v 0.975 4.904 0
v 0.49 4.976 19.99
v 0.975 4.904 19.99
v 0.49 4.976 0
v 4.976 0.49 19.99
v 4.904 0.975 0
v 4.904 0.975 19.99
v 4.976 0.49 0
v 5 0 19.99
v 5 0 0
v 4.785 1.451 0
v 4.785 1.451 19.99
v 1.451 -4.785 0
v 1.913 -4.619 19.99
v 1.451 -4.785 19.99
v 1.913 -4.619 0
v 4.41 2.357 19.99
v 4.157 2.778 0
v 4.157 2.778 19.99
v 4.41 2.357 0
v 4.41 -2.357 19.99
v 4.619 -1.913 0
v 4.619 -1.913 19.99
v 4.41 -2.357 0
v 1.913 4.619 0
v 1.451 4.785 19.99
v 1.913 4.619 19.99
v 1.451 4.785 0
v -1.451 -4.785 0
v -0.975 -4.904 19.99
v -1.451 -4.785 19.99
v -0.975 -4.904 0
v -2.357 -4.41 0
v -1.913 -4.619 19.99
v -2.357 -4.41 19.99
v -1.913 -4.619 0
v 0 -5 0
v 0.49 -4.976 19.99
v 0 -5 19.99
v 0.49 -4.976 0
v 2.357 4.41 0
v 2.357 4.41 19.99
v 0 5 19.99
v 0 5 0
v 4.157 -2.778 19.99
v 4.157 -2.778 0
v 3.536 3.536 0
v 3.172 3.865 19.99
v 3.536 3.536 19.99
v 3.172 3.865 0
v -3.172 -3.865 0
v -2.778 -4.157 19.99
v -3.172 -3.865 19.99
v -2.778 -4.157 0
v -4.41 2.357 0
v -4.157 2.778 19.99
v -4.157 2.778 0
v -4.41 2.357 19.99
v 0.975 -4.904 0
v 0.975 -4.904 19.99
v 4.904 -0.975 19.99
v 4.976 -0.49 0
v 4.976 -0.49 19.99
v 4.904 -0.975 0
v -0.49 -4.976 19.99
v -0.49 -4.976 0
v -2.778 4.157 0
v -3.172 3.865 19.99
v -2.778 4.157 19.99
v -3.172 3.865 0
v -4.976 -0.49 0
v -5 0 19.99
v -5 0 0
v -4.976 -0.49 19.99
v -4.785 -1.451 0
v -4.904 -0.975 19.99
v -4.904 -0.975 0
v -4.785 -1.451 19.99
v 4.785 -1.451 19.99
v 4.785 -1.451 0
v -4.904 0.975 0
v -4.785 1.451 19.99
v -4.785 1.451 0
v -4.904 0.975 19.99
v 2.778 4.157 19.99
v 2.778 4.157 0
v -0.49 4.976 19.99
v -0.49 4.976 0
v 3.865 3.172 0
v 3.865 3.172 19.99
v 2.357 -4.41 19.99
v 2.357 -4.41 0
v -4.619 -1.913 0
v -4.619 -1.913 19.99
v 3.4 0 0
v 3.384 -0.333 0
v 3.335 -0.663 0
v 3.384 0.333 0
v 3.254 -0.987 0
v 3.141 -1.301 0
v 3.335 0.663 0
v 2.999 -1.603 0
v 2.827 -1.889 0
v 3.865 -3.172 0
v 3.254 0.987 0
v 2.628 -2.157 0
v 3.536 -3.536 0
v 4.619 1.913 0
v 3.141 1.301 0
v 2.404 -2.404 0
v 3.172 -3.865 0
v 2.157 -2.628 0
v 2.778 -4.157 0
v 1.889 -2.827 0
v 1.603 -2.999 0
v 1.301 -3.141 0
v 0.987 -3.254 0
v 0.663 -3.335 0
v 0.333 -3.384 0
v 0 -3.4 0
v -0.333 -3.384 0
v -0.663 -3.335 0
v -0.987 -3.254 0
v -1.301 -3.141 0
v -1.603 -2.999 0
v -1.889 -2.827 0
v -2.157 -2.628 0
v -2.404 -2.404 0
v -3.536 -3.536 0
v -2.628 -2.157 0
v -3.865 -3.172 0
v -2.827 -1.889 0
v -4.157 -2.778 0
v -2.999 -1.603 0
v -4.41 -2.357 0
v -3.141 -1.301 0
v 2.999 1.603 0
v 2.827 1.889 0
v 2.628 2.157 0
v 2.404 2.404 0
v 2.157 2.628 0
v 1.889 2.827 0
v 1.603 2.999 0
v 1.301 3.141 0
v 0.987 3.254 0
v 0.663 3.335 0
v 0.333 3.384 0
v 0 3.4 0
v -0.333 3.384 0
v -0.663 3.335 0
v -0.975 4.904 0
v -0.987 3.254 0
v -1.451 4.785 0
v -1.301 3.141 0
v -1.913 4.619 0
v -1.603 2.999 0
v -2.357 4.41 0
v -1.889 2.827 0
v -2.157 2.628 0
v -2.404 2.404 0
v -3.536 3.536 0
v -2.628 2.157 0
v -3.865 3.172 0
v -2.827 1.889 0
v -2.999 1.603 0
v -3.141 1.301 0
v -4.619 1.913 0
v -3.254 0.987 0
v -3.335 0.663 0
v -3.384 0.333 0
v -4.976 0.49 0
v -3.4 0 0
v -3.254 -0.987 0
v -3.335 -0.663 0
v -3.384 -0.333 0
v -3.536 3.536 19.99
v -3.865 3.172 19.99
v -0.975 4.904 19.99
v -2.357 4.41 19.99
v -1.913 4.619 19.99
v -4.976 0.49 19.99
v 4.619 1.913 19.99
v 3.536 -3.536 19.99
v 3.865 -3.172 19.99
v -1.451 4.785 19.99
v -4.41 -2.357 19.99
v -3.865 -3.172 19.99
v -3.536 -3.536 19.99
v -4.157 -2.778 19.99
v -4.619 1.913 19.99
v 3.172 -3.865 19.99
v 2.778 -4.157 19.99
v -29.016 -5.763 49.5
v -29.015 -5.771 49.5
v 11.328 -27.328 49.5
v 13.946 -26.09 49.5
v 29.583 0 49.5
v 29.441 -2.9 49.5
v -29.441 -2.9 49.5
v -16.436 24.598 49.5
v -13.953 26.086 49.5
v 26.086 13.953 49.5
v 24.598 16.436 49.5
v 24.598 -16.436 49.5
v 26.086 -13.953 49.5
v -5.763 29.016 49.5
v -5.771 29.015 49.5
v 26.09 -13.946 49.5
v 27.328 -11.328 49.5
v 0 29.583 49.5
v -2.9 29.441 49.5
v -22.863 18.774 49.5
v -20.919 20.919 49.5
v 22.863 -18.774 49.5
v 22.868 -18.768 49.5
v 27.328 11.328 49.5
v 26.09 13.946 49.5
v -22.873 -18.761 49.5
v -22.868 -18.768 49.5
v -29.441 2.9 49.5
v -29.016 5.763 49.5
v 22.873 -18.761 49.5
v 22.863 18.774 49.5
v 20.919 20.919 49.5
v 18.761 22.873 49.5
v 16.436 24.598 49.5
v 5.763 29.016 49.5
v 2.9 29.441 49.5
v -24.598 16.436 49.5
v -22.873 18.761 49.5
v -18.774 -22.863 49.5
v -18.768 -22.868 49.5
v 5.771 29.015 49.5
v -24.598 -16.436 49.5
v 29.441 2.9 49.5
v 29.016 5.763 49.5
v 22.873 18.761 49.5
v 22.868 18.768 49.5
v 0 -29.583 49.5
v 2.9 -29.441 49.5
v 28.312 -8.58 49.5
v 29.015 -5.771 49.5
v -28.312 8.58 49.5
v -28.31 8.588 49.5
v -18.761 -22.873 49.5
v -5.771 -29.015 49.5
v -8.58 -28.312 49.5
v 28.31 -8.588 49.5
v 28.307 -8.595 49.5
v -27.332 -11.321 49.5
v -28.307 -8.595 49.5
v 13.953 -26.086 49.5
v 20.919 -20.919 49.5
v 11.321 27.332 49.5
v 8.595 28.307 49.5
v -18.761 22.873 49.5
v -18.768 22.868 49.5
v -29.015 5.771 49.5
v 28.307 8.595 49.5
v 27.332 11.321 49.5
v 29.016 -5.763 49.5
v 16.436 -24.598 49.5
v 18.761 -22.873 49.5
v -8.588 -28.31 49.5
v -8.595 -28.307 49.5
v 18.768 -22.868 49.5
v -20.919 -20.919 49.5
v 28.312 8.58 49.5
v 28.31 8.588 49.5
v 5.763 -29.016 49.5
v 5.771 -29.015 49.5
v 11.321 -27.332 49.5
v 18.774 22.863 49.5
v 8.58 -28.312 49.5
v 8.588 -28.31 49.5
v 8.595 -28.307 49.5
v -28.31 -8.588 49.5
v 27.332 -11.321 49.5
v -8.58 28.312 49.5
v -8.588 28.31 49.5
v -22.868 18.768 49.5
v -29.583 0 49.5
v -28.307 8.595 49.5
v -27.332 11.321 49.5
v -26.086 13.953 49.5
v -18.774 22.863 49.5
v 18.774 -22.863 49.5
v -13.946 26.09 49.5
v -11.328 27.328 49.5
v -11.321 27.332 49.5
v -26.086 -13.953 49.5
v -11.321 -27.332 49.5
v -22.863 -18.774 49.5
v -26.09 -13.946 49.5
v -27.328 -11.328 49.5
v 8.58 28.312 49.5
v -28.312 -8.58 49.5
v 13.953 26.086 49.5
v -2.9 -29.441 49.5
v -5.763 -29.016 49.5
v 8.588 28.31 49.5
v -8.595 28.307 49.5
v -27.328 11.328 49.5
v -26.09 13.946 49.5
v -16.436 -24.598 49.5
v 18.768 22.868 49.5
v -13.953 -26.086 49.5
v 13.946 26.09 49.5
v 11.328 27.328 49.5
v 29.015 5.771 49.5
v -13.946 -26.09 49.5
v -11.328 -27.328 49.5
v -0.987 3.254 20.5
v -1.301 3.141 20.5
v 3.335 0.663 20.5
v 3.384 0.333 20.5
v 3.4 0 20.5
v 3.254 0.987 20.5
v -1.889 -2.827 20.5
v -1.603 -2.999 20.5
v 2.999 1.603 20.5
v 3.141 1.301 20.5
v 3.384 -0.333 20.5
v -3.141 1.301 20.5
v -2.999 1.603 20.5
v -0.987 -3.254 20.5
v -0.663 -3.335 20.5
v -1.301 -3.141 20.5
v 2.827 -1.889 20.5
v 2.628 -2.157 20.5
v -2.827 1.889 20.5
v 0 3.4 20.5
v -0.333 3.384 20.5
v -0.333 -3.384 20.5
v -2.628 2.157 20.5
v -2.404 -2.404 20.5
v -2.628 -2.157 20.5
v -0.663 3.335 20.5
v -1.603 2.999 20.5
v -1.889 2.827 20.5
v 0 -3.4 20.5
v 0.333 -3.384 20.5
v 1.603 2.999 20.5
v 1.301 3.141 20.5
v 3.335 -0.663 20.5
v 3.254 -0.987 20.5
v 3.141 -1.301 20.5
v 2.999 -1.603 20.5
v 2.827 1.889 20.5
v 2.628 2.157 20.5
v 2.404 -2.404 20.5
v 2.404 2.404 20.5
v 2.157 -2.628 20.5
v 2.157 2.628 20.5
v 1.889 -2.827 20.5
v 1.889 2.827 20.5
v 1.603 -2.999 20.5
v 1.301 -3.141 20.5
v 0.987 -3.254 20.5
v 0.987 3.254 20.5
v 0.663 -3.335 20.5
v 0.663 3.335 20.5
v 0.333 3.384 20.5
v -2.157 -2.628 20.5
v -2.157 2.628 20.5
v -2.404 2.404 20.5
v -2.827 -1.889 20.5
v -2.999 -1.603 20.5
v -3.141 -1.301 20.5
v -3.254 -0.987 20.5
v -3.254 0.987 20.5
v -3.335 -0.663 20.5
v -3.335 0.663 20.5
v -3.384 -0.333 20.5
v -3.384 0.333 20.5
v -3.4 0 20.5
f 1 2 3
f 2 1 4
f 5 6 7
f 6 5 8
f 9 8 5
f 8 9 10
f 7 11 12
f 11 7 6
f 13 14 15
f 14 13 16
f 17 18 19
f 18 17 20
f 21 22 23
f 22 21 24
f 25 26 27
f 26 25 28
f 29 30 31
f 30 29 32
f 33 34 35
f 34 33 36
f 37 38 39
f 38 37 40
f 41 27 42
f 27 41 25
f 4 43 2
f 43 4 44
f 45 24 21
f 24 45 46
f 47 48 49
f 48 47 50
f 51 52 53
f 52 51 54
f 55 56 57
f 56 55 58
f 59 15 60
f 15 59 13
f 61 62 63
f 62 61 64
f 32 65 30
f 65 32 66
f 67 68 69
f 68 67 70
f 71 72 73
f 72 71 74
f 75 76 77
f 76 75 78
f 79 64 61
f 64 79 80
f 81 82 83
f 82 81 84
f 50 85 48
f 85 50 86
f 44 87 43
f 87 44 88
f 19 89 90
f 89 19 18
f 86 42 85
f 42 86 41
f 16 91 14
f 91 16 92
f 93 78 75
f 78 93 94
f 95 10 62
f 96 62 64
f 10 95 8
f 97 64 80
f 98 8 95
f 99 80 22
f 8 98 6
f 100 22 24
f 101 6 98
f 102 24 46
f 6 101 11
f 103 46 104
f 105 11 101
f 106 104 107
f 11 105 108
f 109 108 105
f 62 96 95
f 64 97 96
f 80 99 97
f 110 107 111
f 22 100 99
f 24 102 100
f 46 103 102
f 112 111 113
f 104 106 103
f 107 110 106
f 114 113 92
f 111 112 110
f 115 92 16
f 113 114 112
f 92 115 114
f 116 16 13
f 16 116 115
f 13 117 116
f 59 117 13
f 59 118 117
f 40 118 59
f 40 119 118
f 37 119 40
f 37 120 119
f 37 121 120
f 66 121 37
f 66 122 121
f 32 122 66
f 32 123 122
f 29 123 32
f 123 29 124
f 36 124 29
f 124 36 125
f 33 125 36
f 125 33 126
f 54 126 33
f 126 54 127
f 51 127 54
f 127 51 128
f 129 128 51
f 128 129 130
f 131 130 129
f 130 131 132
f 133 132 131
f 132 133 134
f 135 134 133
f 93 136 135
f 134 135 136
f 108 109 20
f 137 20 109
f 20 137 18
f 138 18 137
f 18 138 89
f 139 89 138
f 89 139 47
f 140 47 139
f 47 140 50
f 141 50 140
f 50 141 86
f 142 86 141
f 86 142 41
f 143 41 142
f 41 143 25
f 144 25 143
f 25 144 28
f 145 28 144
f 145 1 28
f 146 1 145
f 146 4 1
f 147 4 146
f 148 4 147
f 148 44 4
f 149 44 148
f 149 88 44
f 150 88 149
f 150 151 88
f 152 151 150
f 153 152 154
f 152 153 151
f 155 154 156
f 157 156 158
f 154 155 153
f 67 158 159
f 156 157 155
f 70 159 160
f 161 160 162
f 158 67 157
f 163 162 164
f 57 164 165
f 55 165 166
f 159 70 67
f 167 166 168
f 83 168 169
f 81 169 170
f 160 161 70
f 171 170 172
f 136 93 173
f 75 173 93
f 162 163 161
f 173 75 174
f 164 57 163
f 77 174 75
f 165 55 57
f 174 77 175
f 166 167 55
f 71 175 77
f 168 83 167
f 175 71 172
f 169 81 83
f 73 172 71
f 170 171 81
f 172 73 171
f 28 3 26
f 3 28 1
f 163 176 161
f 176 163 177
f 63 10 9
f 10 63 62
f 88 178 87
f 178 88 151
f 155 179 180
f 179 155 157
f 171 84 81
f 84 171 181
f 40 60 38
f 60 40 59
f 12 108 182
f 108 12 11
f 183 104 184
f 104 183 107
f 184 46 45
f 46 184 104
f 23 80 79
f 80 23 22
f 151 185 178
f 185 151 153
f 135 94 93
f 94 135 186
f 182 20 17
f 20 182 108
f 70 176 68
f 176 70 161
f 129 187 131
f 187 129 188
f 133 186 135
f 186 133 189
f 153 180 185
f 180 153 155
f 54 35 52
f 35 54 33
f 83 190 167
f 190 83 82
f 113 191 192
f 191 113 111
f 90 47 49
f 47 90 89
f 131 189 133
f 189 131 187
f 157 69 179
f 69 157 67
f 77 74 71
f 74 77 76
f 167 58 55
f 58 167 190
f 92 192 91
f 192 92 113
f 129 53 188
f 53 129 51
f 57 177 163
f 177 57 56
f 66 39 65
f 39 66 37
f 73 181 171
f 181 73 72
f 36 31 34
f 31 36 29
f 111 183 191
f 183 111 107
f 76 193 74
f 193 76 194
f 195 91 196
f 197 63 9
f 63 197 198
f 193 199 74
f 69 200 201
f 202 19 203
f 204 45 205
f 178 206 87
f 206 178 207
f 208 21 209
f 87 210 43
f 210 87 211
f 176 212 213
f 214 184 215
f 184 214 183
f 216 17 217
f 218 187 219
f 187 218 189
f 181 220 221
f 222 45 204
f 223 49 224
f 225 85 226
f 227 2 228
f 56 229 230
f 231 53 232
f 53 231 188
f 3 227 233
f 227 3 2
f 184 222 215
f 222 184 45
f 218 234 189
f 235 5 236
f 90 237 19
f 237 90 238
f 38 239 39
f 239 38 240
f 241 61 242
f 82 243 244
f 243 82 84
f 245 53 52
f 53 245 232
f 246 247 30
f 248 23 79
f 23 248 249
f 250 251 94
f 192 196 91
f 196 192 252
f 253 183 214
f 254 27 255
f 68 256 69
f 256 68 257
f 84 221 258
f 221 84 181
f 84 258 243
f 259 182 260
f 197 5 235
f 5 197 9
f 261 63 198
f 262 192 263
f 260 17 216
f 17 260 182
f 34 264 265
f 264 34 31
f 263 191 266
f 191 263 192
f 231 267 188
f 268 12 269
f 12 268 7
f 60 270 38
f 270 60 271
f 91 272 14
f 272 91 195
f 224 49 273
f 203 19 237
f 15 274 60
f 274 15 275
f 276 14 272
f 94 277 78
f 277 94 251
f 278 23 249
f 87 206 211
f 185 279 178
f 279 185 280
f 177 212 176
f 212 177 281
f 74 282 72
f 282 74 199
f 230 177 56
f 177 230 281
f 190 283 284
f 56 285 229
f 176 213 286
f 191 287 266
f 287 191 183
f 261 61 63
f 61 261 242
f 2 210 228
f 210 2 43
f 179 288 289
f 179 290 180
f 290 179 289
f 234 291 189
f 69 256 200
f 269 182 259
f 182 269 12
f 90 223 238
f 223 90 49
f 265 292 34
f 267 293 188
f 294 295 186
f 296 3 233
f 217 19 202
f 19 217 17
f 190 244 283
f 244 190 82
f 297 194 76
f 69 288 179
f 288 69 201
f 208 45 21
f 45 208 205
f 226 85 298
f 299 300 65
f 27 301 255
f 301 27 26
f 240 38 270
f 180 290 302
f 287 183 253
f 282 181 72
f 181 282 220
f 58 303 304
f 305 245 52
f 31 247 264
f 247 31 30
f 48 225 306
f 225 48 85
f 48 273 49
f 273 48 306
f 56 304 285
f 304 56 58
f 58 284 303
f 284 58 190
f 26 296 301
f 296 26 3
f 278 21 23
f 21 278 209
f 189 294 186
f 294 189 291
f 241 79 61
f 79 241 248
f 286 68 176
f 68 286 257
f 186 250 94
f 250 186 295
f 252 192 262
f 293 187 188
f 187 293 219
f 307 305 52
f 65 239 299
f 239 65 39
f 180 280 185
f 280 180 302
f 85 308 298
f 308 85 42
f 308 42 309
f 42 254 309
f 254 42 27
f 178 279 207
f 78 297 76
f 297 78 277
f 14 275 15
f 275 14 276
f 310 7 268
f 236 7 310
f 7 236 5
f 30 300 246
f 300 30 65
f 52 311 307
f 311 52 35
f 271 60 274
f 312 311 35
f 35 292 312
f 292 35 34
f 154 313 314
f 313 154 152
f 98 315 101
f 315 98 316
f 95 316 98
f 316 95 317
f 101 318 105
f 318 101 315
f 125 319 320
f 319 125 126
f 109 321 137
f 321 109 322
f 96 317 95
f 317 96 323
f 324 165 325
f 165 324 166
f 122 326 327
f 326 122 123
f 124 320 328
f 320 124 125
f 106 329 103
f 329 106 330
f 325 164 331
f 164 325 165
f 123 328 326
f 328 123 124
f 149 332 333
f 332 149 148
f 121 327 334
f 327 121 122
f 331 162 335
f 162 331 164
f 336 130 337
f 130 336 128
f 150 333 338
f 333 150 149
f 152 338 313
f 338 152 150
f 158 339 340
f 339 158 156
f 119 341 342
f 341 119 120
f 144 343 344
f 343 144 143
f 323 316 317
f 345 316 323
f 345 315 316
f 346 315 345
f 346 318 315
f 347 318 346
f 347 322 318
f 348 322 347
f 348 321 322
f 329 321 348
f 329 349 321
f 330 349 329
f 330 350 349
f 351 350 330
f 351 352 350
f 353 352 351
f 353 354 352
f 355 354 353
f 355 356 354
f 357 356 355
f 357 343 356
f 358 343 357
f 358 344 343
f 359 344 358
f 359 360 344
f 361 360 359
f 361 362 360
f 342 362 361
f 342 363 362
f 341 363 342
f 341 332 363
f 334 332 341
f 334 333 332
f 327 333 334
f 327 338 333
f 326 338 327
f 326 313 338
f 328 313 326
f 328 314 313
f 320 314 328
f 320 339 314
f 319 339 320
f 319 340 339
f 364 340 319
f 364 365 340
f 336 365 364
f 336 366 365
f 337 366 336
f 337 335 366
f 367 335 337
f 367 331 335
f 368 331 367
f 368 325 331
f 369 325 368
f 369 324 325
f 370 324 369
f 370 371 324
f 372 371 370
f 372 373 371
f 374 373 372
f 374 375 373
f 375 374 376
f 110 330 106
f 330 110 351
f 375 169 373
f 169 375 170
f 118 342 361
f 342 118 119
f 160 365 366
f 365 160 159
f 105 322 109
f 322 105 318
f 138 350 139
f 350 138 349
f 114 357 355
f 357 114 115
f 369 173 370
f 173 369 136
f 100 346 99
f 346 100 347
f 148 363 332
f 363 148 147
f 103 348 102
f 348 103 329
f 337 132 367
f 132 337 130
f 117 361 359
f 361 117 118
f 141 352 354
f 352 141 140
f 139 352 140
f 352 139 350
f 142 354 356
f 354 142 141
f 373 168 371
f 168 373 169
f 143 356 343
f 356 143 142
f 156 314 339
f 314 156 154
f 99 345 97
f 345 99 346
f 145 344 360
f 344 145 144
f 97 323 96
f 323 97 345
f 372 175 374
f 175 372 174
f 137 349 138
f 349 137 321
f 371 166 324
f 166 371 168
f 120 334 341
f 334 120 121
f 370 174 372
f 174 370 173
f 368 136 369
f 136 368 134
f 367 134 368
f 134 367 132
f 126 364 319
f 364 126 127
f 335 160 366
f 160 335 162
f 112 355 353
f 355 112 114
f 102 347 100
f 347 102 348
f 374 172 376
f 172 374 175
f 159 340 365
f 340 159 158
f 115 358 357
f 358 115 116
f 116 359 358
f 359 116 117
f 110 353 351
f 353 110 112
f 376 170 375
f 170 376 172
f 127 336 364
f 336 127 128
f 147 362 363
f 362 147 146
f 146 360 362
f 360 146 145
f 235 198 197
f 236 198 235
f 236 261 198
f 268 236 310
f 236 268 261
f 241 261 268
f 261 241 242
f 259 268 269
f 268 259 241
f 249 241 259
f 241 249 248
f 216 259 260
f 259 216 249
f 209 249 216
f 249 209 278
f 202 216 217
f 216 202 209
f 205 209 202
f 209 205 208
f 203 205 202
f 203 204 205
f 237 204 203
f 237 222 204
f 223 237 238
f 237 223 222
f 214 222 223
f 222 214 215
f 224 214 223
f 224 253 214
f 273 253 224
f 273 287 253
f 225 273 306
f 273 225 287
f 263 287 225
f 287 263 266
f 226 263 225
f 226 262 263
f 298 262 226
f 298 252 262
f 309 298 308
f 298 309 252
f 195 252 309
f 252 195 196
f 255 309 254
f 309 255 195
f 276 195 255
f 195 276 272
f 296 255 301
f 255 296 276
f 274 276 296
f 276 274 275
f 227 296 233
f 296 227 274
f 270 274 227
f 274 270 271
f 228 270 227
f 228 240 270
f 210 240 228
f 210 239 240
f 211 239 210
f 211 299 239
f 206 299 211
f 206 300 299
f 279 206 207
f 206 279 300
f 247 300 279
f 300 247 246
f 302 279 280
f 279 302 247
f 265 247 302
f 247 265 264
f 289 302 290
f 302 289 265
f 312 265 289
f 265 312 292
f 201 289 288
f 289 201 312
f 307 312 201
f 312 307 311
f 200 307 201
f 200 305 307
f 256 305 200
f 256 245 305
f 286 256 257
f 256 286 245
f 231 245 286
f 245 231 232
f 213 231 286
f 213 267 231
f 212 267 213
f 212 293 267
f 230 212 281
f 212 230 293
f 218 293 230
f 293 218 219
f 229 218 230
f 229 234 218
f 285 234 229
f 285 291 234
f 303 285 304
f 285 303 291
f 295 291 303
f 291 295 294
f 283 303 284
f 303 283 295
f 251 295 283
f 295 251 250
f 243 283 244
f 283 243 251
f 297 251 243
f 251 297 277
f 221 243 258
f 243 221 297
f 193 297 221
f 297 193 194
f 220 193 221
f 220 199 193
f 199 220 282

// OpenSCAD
// Small lab funnel, printed upright
// Units: mm

$fn = 64;

// --- Dimensions ---
spout_od      = 10;    // spout outer diameter
spout_len     = 20;    // spout length (z = 0 to 20)
spout_wall    = 1.6;   // wall thickness everywhere
cone_bottom_d = 10;    // cone outer diameter at z = 20
cone_top_d    = 60;    // rim outer diameter at z = 50
rim_z         = 50;    // rim height
eps           = 0.5;   // cutter overshoot

// --- Derived ---
spout_id = spout_od - 2 * spout_wall;   // 6.8 mm bore

difference() {
    union() {
        // Spout
        cylinder(d = spout_od, h = spout_len);
        // Cone (overlaps spout slightly for a clean union)
        translate([0, 0, spout_len - 0.01])
            cylinder(d1 = cone_bottom_d, d2 = cone_top_d, h = rim_z - spout_len + 0.01);
    }
    // Hollow the spout bore through the full length
    translate([0, 0, -eps])
        cylinder(d = spout_id, h = spout_len + 2 * eps);
    // Open the top rim
    translate([0, 0, rim_z - eps])
        cylinder(d1 = cone_top_d, d2 = cone_top_d + 2 * eps, h = eps);
}
